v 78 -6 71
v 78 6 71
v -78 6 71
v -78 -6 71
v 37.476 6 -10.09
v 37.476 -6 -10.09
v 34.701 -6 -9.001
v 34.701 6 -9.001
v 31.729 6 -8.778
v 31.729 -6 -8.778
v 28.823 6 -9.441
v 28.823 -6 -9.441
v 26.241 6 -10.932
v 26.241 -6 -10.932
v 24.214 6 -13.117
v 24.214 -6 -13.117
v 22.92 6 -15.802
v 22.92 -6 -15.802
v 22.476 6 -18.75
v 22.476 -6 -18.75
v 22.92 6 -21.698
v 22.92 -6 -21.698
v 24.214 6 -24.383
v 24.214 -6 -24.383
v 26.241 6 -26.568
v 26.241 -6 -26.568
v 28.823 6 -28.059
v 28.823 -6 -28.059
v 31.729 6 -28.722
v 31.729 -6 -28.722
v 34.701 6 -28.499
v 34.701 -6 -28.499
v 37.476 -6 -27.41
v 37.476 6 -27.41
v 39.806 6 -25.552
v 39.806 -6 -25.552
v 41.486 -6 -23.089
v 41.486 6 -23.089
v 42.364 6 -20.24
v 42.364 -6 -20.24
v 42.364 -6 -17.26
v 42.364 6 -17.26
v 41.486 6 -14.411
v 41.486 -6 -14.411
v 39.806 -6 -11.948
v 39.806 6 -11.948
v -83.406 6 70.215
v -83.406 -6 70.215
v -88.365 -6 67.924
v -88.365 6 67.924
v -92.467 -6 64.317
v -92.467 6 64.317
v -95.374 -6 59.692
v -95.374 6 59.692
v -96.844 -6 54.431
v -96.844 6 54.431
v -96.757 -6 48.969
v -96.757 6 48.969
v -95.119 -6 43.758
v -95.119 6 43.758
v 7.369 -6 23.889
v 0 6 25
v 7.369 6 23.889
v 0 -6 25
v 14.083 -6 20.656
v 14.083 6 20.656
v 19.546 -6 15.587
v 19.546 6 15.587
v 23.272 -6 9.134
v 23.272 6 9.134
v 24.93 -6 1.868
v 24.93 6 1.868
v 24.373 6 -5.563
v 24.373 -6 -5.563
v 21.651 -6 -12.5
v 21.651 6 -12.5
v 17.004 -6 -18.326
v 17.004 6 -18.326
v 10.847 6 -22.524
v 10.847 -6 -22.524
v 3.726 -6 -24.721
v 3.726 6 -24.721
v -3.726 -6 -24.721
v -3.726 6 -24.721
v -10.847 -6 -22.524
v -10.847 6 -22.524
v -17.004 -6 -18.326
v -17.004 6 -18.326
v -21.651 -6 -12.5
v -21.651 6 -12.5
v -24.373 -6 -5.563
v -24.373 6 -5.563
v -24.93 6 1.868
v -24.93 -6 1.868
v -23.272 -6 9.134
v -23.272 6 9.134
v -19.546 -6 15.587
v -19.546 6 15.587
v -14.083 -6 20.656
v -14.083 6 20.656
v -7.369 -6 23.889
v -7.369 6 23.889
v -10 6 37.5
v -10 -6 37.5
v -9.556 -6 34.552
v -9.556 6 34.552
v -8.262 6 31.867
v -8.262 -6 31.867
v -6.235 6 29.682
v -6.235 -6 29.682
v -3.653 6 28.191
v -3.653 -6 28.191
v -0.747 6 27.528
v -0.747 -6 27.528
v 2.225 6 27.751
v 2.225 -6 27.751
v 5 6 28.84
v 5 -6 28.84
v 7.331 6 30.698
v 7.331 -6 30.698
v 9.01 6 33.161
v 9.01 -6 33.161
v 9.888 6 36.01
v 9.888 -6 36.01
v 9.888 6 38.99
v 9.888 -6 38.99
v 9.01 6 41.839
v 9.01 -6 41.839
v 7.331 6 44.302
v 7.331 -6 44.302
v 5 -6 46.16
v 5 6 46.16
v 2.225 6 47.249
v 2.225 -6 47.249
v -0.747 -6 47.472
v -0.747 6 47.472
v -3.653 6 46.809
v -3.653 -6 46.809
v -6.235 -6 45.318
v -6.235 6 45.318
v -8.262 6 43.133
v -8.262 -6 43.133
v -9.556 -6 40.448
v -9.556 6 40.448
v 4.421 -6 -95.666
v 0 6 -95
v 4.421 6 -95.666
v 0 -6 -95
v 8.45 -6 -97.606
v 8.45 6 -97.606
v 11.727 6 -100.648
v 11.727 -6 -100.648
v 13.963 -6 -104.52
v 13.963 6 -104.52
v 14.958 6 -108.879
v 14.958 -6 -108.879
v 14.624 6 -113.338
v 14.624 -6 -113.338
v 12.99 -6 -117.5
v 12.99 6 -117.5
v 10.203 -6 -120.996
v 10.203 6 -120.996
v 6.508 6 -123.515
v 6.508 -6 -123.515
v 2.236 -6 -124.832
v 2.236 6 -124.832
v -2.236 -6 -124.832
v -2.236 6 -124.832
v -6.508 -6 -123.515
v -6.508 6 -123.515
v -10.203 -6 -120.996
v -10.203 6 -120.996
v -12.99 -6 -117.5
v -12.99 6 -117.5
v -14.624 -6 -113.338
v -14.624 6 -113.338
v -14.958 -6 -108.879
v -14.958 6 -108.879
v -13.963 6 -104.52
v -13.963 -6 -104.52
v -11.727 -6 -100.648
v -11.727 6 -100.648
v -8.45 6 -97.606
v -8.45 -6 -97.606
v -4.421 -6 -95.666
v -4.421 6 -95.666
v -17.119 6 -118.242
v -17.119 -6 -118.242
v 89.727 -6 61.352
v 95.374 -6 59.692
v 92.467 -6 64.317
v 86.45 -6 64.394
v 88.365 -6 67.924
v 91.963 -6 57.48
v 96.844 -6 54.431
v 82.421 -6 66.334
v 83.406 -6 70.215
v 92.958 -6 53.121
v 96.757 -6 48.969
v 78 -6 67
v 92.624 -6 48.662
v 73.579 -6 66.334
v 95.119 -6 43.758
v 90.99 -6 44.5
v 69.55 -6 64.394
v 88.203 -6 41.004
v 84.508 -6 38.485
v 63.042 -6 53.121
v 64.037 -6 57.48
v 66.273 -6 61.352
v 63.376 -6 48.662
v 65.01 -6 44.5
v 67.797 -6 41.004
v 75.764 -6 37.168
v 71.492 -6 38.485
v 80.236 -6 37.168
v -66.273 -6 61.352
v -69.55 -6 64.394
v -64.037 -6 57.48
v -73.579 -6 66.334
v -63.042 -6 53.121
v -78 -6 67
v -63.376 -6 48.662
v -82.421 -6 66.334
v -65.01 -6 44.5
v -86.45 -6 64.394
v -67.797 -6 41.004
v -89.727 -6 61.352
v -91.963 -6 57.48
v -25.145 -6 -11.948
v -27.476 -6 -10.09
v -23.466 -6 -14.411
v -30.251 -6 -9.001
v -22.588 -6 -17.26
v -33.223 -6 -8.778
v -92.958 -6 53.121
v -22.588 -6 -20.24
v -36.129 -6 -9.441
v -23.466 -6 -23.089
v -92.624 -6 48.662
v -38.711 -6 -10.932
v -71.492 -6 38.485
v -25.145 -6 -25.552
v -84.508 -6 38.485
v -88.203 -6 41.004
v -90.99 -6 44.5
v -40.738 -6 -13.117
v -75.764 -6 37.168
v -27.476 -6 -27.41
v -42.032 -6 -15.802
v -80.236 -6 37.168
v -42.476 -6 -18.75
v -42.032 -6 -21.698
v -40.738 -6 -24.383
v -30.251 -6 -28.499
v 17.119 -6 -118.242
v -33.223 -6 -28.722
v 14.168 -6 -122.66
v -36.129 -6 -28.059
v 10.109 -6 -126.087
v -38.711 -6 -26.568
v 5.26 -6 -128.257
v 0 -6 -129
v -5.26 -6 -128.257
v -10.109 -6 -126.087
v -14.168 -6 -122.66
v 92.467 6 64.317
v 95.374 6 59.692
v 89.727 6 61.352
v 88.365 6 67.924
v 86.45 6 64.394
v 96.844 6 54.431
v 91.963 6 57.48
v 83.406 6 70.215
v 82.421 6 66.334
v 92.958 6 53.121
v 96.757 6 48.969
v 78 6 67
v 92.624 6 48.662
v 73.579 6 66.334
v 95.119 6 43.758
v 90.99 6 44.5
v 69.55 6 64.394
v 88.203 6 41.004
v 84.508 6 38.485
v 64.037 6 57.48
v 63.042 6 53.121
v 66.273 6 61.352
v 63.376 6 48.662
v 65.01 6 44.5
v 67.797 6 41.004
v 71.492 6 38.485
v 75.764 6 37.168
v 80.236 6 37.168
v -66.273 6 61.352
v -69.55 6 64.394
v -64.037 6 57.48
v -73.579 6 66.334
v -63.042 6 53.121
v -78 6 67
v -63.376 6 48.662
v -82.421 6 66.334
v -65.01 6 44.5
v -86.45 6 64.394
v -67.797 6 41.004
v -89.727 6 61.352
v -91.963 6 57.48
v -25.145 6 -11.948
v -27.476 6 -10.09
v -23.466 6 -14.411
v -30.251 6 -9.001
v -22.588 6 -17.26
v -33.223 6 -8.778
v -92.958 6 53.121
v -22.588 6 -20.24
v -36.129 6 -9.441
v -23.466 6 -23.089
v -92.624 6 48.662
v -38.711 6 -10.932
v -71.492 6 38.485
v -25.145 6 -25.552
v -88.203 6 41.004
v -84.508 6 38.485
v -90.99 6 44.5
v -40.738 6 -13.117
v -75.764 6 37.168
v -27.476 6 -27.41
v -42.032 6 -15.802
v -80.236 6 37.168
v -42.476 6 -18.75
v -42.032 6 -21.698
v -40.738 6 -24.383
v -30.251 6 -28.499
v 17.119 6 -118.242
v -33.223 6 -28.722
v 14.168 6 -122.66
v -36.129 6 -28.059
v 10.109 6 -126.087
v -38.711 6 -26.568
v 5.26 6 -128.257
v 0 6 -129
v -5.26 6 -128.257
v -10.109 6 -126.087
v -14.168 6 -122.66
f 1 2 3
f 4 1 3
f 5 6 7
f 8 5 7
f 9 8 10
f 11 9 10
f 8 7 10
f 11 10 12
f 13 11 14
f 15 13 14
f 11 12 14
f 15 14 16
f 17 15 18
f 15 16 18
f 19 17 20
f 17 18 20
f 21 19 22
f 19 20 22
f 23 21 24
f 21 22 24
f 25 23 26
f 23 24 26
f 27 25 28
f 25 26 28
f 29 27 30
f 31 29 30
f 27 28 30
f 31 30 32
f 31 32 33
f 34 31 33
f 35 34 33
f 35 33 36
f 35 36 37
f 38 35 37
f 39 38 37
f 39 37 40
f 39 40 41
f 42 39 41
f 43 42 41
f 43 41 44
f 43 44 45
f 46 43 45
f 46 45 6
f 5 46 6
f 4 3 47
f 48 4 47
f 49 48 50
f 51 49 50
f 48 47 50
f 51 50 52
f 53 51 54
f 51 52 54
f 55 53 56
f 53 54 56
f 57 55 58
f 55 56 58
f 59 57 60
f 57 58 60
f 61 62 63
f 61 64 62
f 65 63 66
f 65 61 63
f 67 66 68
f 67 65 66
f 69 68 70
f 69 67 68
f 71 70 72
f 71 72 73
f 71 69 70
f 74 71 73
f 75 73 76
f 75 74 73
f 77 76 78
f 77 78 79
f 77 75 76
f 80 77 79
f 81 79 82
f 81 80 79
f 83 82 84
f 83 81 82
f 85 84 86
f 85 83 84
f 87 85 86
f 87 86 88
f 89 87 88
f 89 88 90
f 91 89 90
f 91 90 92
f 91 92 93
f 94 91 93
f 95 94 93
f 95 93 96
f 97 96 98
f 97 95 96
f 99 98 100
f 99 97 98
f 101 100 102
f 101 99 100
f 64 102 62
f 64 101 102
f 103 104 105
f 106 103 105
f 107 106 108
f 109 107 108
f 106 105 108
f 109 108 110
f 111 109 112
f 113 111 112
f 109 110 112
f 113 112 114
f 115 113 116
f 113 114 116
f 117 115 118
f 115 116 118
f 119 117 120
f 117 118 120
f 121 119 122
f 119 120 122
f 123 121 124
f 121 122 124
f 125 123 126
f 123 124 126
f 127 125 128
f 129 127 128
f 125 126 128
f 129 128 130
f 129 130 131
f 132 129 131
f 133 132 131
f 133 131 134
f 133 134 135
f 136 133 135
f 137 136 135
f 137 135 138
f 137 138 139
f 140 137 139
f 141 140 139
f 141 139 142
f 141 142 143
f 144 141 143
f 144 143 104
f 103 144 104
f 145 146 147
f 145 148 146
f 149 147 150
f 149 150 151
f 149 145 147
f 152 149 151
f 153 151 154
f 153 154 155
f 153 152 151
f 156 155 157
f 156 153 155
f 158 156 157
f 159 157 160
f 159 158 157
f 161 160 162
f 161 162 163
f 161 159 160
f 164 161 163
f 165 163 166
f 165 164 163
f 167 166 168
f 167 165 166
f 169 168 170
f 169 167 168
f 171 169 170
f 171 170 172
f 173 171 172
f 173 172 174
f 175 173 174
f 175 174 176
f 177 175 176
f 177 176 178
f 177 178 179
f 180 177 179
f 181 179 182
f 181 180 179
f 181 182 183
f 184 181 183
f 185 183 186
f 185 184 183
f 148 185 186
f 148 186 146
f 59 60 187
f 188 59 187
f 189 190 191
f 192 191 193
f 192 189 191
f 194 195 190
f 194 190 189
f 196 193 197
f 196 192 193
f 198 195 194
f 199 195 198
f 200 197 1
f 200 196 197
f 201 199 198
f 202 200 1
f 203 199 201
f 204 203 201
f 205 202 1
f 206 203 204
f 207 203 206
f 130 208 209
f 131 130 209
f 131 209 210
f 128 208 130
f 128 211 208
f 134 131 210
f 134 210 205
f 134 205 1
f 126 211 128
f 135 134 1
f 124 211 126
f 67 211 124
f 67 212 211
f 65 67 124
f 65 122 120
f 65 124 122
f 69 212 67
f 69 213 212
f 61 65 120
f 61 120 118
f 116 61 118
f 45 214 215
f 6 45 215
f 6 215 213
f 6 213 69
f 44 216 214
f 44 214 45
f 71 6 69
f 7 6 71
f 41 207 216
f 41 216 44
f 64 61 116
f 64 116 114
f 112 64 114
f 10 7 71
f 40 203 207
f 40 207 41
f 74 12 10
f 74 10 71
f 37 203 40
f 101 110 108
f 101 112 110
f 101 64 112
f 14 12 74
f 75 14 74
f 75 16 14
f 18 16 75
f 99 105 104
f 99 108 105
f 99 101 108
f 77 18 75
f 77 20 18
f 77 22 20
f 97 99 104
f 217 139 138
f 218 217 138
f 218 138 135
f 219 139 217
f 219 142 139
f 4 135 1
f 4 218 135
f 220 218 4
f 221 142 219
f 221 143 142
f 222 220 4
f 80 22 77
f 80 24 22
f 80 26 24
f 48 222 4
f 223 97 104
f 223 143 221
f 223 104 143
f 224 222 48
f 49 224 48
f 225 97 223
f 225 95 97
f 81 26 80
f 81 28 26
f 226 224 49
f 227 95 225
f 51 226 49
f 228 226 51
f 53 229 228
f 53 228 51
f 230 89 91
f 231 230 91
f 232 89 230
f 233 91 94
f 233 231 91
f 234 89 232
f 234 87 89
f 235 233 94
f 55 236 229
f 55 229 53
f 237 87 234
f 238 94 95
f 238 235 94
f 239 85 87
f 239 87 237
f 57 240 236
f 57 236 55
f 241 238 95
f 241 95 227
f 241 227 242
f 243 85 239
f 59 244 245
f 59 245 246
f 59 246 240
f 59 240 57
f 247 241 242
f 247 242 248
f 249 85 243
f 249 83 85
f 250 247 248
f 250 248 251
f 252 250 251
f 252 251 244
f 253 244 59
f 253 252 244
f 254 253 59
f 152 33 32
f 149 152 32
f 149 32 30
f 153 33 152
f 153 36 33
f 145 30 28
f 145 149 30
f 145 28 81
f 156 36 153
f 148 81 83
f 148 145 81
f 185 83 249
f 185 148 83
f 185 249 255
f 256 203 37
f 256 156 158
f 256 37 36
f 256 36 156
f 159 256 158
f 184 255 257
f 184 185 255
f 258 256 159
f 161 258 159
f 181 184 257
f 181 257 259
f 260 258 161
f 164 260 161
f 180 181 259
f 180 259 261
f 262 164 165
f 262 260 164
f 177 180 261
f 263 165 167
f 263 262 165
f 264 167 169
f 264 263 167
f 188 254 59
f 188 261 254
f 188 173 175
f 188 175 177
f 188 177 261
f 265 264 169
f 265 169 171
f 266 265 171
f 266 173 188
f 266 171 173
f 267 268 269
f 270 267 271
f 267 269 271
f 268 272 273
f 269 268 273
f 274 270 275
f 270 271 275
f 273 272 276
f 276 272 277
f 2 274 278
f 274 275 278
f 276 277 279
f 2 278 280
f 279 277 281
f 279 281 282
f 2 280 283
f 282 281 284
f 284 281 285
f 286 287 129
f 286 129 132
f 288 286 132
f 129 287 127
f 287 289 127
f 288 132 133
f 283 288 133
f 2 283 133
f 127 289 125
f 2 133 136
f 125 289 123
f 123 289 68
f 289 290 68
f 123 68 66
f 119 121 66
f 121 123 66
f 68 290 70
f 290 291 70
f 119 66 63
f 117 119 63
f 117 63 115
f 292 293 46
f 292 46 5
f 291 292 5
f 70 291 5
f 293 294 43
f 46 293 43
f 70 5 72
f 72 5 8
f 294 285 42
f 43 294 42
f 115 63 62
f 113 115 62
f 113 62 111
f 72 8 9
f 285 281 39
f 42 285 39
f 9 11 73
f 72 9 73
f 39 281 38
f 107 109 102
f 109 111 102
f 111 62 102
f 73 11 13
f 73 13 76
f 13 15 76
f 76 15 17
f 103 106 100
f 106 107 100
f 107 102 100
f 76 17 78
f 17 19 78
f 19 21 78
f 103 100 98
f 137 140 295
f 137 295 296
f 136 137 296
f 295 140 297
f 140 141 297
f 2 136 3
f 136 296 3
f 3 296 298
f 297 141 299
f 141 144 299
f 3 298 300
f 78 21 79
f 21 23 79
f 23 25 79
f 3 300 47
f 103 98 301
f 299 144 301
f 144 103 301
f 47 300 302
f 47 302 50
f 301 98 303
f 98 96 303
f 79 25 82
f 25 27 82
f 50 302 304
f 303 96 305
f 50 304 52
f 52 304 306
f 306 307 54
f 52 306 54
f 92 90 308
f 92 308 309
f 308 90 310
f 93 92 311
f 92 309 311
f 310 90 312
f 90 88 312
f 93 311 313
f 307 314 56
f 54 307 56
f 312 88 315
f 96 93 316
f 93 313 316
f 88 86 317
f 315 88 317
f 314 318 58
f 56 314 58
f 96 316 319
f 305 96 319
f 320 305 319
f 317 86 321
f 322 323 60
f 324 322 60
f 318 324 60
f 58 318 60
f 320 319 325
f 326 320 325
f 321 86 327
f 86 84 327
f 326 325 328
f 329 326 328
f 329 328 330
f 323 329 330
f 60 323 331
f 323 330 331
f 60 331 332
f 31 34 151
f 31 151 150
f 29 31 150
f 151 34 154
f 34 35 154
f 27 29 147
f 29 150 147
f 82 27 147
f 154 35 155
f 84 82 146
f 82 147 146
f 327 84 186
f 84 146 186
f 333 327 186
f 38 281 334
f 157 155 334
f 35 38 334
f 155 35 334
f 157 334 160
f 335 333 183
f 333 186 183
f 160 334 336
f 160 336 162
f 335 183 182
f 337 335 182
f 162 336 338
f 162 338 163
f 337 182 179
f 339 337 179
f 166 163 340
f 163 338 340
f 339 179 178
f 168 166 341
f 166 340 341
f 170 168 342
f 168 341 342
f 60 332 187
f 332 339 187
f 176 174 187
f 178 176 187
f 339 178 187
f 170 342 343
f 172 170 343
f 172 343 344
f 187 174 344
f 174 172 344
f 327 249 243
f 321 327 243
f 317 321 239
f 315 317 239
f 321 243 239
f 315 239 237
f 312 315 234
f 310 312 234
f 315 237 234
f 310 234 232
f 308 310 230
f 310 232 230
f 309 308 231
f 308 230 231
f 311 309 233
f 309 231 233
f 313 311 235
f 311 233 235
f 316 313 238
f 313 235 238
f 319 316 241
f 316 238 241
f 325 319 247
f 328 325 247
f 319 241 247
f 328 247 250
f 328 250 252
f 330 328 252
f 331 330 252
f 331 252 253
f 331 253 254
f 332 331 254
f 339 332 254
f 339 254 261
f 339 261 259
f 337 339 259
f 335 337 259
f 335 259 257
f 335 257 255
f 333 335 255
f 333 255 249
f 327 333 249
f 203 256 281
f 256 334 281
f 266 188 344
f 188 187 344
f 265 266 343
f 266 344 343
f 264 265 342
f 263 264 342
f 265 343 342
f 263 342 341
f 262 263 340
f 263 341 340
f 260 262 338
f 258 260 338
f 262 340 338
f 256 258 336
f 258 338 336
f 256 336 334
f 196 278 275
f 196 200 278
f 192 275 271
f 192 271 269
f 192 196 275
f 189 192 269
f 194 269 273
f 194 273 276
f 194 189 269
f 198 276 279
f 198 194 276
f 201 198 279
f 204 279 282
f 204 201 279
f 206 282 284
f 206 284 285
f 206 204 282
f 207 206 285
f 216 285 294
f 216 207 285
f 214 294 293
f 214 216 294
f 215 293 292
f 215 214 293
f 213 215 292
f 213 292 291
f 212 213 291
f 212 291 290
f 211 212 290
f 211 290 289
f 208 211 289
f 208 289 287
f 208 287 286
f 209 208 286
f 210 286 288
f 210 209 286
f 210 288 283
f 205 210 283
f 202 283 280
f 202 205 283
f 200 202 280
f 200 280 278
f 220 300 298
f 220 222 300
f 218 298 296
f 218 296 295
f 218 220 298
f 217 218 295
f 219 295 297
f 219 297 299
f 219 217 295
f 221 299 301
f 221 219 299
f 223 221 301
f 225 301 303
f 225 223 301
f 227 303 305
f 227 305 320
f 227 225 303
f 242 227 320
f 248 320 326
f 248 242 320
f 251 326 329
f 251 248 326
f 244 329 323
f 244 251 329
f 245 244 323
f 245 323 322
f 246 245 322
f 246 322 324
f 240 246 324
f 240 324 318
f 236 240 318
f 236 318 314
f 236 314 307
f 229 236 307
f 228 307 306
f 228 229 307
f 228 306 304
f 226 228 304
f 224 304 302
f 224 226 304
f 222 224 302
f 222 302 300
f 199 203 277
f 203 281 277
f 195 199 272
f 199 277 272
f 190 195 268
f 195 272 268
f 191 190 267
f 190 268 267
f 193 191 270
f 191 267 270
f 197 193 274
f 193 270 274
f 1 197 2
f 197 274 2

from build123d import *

# Parameters (mm, degrees)
SKETCH1_R           = 15
SKETCH1_R_2         = 25
BOSS_EXTRUDE1_DEPTH = 6
HOLE1_D             = 20
CIRPATTERN1_COUNT   = 3


with BuildPart() as part:
    # Sketch1 → Boss-Extrude1 (new, symmetric)
    with BuildSketch(Plane(origin=(0, 0, 0), x_dir=(1, 0, 0), z_dir=(0, 1, 0))):
        with BuildLine():
            Line((-95.119031725, -43.757503243), (-17.119031725, 118.242496757))
            ThreePointArc((-17.119031725, 118.242496757), (0, 129), (17.119031725, 118.242496757))
            Line((17.119031725, 118.242496757), (95.119031725, -43.757503243))
            ThreePointArc((95.119031725, -43.757503243), (94.087377636, -62.109217616), (78, -71))
            Line((78, -71), (-78, -71))
            ThreePointArc((-78, -71), (-94.087377636, -62.109217616), (-95.119031725, -43.757503243))
        make_face()
        with Locations(Location((0, 110, 0), (0, 0, 270))):
            Circle(SKETCH1_R, mode=Mode.SUBTRACT)
        with Locations(Location((-78, -52, 0), (0, 0, 270))):
            Circle(SKETCH1_R, mode=Mode.SUBTRACT)
        with Locations(Location((78, -52, 0), (0, 0, 270))):
            Circle(SKETCH1_R, mode=Mode.SUBTRACT)
        with Locations(Location((0, 0, 0), (0, 0, 270))):
            Circle(SKETCH1_R_2, mode=Mode.SUBTRACT)
    extrude(amount=BOSS_EXTRUDE1_DEPTH, both=True)

    # Hole1 (through all)
    with Locations(Plane(origin=(0, 6, 0), x_dir=(1, 0, 0), z_dir=(0, 1, 0))):
        with Locations((0, -37.5)):
            hole1 = Hole(HOLE1_D / 2)

    # CirPattern1: Hole1 ×3 about axis
    cirpattern1_axis = Axis((0, 0, 0), (0, 1, 0))
    for i in range(1, CIRPATTERN1_COUNT):
        add(hole1.rotate(cirpattern1_axis, i * 360 / CIRPATTERN1_COUNT), mode=Mode.SUBTRACT)


solid = part.part
